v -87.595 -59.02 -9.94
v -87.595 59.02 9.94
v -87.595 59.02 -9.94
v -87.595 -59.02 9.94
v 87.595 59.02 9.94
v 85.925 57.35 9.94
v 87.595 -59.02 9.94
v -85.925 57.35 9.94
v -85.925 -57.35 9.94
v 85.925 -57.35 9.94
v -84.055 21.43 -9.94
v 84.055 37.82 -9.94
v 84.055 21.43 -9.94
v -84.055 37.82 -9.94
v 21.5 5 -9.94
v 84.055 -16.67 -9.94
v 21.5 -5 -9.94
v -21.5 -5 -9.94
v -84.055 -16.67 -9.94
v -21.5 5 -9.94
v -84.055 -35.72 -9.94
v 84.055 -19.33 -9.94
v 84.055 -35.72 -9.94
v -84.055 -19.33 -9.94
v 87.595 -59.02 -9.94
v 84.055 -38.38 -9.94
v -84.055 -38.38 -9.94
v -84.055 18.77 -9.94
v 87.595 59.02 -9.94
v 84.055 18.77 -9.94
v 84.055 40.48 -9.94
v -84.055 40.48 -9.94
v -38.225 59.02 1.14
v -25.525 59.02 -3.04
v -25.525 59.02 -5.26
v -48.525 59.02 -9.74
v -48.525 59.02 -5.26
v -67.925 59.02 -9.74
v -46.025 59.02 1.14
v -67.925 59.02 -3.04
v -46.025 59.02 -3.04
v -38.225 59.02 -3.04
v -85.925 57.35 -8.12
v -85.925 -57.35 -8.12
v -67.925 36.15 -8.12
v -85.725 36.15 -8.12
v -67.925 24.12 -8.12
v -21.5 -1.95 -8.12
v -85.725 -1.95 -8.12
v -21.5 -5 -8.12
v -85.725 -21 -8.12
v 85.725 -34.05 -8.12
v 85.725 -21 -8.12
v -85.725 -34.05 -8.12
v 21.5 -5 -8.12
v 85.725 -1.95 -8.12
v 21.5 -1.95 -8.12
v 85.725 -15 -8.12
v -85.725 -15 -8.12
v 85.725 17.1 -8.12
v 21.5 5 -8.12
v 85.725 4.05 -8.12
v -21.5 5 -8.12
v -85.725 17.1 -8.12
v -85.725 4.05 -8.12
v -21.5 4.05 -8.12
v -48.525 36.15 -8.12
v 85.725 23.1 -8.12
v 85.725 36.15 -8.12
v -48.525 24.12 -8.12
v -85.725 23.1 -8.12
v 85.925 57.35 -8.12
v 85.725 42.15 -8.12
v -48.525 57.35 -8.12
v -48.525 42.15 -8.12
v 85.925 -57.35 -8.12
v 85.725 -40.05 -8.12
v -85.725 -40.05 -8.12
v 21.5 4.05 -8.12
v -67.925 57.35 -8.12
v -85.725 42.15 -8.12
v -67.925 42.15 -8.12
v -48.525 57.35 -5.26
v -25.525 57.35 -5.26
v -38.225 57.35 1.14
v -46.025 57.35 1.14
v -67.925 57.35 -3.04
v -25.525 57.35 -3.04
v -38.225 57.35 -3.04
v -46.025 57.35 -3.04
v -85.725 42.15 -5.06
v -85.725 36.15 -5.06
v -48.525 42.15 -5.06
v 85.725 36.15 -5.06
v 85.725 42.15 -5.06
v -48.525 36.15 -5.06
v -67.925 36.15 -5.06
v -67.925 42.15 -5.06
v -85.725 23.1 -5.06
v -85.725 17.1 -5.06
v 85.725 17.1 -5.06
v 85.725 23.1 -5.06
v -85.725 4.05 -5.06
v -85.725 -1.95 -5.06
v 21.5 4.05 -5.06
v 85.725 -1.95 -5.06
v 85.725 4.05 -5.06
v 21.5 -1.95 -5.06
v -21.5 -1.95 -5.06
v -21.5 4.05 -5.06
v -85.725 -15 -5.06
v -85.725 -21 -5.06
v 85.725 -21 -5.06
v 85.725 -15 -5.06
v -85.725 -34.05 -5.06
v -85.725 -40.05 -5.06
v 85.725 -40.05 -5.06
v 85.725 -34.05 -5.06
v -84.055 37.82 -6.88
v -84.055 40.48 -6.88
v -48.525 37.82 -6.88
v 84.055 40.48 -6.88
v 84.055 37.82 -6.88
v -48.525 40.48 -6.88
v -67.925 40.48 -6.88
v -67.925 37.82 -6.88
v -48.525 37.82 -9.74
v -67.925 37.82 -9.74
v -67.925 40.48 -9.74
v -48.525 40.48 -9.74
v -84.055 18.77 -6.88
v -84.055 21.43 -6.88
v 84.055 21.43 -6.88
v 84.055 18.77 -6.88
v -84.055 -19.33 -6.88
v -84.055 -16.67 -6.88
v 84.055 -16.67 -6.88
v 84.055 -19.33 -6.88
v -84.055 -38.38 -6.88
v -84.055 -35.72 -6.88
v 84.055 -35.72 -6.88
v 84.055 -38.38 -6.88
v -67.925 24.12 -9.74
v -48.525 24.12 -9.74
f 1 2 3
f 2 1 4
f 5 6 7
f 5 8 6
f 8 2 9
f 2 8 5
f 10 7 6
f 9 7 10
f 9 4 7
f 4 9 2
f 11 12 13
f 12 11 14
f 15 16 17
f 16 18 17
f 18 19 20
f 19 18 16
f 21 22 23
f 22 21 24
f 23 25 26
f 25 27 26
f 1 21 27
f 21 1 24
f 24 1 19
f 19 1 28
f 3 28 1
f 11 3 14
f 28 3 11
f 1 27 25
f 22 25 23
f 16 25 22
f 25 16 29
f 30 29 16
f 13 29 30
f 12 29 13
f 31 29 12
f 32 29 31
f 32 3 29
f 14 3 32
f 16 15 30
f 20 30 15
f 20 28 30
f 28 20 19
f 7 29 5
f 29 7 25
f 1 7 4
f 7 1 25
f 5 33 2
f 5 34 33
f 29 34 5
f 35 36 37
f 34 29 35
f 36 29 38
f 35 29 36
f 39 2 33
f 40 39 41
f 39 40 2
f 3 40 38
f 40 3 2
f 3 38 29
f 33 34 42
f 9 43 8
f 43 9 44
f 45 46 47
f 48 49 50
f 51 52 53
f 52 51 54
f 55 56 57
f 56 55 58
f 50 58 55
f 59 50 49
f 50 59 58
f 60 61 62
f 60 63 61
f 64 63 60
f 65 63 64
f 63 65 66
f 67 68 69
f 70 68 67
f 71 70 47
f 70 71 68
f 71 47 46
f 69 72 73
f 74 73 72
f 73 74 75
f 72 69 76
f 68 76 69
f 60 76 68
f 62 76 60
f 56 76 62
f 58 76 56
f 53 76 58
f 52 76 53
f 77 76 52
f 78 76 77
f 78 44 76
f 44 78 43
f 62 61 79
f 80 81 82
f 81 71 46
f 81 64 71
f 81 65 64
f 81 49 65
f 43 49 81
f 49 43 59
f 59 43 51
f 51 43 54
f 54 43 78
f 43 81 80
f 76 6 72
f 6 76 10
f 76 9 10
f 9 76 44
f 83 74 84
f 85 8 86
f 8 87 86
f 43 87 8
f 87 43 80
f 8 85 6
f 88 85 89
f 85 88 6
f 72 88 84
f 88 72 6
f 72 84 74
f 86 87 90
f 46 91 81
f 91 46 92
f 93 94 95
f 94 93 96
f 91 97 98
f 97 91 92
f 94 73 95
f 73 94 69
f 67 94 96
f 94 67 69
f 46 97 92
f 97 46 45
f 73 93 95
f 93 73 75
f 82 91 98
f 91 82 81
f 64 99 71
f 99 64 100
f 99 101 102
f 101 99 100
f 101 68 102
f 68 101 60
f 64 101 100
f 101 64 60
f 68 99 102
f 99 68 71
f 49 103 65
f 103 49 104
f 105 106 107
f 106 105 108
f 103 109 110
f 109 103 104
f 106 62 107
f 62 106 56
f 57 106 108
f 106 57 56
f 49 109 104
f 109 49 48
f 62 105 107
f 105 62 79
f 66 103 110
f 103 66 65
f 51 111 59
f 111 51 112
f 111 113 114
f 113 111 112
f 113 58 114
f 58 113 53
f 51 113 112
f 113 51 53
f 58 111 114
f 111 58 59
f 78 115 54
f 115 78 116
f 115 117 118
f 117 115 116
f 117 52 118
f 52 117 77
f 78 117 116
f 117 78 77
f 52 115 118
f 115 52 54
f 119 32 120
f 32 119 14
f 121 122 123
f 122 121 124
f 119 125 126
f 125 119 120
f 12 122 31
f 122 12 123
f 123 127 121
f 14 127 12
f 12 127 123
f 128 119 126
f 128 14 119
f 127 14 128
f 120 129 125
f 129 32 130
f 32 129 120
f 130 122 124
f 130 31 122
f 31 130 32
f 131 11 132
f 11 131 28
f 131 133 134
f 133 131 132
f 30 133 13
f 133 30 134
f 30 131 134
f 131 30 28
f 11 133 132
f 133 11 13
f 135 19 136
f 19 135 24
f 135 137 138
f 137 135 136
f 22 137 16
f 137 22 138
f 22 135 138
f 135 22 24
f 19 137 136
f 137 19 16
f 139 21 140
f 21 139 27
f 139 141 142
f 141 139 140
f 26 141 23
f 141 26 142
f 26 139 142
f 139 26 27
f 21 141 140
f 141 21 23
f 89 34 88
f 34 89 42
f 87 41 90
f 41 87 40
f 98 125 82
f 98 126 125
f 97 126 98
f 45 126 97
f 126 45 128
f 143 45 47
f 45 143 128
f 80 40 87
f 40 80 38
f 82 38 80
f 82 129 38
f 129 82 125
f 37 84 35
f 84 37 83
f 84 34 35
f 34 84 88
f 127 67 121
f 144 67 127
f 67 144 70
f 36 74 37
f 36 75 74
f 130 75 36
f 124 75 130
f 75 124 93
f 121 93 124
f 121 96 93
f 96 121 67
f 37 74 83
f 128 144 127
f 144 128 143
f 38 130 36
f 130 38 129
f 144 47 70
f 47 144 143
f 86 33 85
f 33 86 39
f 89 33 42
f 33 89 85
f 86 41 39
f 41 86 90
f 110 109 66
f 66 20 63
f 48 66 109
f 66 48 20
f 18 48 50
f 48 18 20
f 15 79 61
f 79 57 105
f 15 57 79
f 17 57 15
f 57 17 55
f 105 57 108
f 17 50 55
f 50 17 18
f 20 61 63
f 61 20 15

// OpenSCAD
debug=false;

// non-design measurements
key_spacing = 19.05;
key_cutout_w = .551 * 25.4;

slop = .2;
wall_thicc = 1.67;
pcb_thickness = 1.62 + slop;

inner_w = 9 * key_spacing;
inner_l = 6 * key_spacing;
delta_y = 15; //bottom of pcb to edge of keycaps
solder_gap = 6.5 - pcb_thickness - pcb_thickness + .2;
inner_h = delta_y + solder_gap;
w=inner_w+2*(wall_thicc+slop);
l=inner_l+2*(wall_thicc+slop);
h=inner_h + pcb_thickness;
supp_offset = 15;
supp_width = 21 - supp_offset;

depth=wall_thicc-.45;

module img(){
	if($preview){
		scale([13426/135,402/(4-1),depth/100]) surface("metamorphosis-straightened-widecrop100.png", center = true, invert=false);
	} else {
		scale([13462/1346,402/(40-1),depth/100]) surface("metamorphosis-straightened-widecrop10-levels.png", center = true, invert=false);
	}
}

module base() difference() {
    union() {
        //basic body
        difference() {
            translate([- wall_thicc - slop, - wall_thicc - slop, - pcb_thickness])
                cube([w, l, h]);
            translate([- slop, - slop, 0])
                cube([key_spacing * 9 + 2 * slop, key_spacing * 6 + 2 * slop, inner_h + .1]);
        }
        //supports
        for (i = [0:4]) {
            translate([0, supp_offset + key_spacing * i, - pcb_thickness])
                cube([key_spacing * 9, supp_width, solder_gap + pcb_thickness]);
        }

        //brim
        if(false) for (x = [- wall_thicc - slop, key_spacing * 9 + wall_thicc + slop], y = [- wall_thicc - slop, key_spacing * 6 +
            wall_thicc + slop]) {
            translate([x, y, - pcb_thickness])
                cylinder(h = .2, d = 30);
        }
    }
        cube([8 + 2 * slop, wall_thicc + .2, pcb_thickness + solder_gap + slop]);
    //buttons hole`
    translate([inner_w - 18 + slop, - wall_thicc - slop - .1, solder_gap-slop])
        mirror([1, 0, 0])
            cube([42 + 2 * slop, wall_thicc + .2, pcb_thickness + 2*slop]);
    // daughter board
    translate([inner_w - 18 + slop, - wall_thicc - slop - .1, - pcb_thickness + .2])
        mirror([1, 0, 0])
            cube([19 + 2 * slop, 35, solder_gap + pcb_thickness + slop]);
    // reset button
    translate([inner_w - 47.3 + 7.4 + slop, - wall_thicc - slop - .1, solder_gap])
        mirror([1, 0, 0])
            cube([7.4 + 2 * slop, wall_thicc + .2, 6 + slop]);
    //logo window
    translate([inner_w / 2, inner_l / 2, - pcb_thickness - .1]) {
        cube([39+4, 6+4, 20], center = true);
    }
    //
    for (i = [0, 1, 3, 4]) {
        translate([wall_thicc, supp_offset + key_spacing * i + wall_thicc, - pcb_thickness - .1])
            cube([key_spacing * 9 - 2 * wall_thicc, supp_width - 2 * wall_thicc, solder_gap + .1]);
    }
}

difference(){
	rotate([0,0,180]) translate([wall_thicc+slop-w/2,wall_thicc+slop-l/2,pcb_thickness-h/2]) base();
	rotate([0,0,-90]){
		translate([l/2,0,0])
			rotate([90,0,-90])
			scale([h/402,h/402,1]) img();
		translate([w/2+l/2,-w/2,0])
			rotate([90,0,180])
			scale([h/402,h/402,1]) img();
		translate([w/2+l/2,w/2,0])
			rotate([90,0,0])
			scale([h/402,h/402,1]) img();
	}
}
